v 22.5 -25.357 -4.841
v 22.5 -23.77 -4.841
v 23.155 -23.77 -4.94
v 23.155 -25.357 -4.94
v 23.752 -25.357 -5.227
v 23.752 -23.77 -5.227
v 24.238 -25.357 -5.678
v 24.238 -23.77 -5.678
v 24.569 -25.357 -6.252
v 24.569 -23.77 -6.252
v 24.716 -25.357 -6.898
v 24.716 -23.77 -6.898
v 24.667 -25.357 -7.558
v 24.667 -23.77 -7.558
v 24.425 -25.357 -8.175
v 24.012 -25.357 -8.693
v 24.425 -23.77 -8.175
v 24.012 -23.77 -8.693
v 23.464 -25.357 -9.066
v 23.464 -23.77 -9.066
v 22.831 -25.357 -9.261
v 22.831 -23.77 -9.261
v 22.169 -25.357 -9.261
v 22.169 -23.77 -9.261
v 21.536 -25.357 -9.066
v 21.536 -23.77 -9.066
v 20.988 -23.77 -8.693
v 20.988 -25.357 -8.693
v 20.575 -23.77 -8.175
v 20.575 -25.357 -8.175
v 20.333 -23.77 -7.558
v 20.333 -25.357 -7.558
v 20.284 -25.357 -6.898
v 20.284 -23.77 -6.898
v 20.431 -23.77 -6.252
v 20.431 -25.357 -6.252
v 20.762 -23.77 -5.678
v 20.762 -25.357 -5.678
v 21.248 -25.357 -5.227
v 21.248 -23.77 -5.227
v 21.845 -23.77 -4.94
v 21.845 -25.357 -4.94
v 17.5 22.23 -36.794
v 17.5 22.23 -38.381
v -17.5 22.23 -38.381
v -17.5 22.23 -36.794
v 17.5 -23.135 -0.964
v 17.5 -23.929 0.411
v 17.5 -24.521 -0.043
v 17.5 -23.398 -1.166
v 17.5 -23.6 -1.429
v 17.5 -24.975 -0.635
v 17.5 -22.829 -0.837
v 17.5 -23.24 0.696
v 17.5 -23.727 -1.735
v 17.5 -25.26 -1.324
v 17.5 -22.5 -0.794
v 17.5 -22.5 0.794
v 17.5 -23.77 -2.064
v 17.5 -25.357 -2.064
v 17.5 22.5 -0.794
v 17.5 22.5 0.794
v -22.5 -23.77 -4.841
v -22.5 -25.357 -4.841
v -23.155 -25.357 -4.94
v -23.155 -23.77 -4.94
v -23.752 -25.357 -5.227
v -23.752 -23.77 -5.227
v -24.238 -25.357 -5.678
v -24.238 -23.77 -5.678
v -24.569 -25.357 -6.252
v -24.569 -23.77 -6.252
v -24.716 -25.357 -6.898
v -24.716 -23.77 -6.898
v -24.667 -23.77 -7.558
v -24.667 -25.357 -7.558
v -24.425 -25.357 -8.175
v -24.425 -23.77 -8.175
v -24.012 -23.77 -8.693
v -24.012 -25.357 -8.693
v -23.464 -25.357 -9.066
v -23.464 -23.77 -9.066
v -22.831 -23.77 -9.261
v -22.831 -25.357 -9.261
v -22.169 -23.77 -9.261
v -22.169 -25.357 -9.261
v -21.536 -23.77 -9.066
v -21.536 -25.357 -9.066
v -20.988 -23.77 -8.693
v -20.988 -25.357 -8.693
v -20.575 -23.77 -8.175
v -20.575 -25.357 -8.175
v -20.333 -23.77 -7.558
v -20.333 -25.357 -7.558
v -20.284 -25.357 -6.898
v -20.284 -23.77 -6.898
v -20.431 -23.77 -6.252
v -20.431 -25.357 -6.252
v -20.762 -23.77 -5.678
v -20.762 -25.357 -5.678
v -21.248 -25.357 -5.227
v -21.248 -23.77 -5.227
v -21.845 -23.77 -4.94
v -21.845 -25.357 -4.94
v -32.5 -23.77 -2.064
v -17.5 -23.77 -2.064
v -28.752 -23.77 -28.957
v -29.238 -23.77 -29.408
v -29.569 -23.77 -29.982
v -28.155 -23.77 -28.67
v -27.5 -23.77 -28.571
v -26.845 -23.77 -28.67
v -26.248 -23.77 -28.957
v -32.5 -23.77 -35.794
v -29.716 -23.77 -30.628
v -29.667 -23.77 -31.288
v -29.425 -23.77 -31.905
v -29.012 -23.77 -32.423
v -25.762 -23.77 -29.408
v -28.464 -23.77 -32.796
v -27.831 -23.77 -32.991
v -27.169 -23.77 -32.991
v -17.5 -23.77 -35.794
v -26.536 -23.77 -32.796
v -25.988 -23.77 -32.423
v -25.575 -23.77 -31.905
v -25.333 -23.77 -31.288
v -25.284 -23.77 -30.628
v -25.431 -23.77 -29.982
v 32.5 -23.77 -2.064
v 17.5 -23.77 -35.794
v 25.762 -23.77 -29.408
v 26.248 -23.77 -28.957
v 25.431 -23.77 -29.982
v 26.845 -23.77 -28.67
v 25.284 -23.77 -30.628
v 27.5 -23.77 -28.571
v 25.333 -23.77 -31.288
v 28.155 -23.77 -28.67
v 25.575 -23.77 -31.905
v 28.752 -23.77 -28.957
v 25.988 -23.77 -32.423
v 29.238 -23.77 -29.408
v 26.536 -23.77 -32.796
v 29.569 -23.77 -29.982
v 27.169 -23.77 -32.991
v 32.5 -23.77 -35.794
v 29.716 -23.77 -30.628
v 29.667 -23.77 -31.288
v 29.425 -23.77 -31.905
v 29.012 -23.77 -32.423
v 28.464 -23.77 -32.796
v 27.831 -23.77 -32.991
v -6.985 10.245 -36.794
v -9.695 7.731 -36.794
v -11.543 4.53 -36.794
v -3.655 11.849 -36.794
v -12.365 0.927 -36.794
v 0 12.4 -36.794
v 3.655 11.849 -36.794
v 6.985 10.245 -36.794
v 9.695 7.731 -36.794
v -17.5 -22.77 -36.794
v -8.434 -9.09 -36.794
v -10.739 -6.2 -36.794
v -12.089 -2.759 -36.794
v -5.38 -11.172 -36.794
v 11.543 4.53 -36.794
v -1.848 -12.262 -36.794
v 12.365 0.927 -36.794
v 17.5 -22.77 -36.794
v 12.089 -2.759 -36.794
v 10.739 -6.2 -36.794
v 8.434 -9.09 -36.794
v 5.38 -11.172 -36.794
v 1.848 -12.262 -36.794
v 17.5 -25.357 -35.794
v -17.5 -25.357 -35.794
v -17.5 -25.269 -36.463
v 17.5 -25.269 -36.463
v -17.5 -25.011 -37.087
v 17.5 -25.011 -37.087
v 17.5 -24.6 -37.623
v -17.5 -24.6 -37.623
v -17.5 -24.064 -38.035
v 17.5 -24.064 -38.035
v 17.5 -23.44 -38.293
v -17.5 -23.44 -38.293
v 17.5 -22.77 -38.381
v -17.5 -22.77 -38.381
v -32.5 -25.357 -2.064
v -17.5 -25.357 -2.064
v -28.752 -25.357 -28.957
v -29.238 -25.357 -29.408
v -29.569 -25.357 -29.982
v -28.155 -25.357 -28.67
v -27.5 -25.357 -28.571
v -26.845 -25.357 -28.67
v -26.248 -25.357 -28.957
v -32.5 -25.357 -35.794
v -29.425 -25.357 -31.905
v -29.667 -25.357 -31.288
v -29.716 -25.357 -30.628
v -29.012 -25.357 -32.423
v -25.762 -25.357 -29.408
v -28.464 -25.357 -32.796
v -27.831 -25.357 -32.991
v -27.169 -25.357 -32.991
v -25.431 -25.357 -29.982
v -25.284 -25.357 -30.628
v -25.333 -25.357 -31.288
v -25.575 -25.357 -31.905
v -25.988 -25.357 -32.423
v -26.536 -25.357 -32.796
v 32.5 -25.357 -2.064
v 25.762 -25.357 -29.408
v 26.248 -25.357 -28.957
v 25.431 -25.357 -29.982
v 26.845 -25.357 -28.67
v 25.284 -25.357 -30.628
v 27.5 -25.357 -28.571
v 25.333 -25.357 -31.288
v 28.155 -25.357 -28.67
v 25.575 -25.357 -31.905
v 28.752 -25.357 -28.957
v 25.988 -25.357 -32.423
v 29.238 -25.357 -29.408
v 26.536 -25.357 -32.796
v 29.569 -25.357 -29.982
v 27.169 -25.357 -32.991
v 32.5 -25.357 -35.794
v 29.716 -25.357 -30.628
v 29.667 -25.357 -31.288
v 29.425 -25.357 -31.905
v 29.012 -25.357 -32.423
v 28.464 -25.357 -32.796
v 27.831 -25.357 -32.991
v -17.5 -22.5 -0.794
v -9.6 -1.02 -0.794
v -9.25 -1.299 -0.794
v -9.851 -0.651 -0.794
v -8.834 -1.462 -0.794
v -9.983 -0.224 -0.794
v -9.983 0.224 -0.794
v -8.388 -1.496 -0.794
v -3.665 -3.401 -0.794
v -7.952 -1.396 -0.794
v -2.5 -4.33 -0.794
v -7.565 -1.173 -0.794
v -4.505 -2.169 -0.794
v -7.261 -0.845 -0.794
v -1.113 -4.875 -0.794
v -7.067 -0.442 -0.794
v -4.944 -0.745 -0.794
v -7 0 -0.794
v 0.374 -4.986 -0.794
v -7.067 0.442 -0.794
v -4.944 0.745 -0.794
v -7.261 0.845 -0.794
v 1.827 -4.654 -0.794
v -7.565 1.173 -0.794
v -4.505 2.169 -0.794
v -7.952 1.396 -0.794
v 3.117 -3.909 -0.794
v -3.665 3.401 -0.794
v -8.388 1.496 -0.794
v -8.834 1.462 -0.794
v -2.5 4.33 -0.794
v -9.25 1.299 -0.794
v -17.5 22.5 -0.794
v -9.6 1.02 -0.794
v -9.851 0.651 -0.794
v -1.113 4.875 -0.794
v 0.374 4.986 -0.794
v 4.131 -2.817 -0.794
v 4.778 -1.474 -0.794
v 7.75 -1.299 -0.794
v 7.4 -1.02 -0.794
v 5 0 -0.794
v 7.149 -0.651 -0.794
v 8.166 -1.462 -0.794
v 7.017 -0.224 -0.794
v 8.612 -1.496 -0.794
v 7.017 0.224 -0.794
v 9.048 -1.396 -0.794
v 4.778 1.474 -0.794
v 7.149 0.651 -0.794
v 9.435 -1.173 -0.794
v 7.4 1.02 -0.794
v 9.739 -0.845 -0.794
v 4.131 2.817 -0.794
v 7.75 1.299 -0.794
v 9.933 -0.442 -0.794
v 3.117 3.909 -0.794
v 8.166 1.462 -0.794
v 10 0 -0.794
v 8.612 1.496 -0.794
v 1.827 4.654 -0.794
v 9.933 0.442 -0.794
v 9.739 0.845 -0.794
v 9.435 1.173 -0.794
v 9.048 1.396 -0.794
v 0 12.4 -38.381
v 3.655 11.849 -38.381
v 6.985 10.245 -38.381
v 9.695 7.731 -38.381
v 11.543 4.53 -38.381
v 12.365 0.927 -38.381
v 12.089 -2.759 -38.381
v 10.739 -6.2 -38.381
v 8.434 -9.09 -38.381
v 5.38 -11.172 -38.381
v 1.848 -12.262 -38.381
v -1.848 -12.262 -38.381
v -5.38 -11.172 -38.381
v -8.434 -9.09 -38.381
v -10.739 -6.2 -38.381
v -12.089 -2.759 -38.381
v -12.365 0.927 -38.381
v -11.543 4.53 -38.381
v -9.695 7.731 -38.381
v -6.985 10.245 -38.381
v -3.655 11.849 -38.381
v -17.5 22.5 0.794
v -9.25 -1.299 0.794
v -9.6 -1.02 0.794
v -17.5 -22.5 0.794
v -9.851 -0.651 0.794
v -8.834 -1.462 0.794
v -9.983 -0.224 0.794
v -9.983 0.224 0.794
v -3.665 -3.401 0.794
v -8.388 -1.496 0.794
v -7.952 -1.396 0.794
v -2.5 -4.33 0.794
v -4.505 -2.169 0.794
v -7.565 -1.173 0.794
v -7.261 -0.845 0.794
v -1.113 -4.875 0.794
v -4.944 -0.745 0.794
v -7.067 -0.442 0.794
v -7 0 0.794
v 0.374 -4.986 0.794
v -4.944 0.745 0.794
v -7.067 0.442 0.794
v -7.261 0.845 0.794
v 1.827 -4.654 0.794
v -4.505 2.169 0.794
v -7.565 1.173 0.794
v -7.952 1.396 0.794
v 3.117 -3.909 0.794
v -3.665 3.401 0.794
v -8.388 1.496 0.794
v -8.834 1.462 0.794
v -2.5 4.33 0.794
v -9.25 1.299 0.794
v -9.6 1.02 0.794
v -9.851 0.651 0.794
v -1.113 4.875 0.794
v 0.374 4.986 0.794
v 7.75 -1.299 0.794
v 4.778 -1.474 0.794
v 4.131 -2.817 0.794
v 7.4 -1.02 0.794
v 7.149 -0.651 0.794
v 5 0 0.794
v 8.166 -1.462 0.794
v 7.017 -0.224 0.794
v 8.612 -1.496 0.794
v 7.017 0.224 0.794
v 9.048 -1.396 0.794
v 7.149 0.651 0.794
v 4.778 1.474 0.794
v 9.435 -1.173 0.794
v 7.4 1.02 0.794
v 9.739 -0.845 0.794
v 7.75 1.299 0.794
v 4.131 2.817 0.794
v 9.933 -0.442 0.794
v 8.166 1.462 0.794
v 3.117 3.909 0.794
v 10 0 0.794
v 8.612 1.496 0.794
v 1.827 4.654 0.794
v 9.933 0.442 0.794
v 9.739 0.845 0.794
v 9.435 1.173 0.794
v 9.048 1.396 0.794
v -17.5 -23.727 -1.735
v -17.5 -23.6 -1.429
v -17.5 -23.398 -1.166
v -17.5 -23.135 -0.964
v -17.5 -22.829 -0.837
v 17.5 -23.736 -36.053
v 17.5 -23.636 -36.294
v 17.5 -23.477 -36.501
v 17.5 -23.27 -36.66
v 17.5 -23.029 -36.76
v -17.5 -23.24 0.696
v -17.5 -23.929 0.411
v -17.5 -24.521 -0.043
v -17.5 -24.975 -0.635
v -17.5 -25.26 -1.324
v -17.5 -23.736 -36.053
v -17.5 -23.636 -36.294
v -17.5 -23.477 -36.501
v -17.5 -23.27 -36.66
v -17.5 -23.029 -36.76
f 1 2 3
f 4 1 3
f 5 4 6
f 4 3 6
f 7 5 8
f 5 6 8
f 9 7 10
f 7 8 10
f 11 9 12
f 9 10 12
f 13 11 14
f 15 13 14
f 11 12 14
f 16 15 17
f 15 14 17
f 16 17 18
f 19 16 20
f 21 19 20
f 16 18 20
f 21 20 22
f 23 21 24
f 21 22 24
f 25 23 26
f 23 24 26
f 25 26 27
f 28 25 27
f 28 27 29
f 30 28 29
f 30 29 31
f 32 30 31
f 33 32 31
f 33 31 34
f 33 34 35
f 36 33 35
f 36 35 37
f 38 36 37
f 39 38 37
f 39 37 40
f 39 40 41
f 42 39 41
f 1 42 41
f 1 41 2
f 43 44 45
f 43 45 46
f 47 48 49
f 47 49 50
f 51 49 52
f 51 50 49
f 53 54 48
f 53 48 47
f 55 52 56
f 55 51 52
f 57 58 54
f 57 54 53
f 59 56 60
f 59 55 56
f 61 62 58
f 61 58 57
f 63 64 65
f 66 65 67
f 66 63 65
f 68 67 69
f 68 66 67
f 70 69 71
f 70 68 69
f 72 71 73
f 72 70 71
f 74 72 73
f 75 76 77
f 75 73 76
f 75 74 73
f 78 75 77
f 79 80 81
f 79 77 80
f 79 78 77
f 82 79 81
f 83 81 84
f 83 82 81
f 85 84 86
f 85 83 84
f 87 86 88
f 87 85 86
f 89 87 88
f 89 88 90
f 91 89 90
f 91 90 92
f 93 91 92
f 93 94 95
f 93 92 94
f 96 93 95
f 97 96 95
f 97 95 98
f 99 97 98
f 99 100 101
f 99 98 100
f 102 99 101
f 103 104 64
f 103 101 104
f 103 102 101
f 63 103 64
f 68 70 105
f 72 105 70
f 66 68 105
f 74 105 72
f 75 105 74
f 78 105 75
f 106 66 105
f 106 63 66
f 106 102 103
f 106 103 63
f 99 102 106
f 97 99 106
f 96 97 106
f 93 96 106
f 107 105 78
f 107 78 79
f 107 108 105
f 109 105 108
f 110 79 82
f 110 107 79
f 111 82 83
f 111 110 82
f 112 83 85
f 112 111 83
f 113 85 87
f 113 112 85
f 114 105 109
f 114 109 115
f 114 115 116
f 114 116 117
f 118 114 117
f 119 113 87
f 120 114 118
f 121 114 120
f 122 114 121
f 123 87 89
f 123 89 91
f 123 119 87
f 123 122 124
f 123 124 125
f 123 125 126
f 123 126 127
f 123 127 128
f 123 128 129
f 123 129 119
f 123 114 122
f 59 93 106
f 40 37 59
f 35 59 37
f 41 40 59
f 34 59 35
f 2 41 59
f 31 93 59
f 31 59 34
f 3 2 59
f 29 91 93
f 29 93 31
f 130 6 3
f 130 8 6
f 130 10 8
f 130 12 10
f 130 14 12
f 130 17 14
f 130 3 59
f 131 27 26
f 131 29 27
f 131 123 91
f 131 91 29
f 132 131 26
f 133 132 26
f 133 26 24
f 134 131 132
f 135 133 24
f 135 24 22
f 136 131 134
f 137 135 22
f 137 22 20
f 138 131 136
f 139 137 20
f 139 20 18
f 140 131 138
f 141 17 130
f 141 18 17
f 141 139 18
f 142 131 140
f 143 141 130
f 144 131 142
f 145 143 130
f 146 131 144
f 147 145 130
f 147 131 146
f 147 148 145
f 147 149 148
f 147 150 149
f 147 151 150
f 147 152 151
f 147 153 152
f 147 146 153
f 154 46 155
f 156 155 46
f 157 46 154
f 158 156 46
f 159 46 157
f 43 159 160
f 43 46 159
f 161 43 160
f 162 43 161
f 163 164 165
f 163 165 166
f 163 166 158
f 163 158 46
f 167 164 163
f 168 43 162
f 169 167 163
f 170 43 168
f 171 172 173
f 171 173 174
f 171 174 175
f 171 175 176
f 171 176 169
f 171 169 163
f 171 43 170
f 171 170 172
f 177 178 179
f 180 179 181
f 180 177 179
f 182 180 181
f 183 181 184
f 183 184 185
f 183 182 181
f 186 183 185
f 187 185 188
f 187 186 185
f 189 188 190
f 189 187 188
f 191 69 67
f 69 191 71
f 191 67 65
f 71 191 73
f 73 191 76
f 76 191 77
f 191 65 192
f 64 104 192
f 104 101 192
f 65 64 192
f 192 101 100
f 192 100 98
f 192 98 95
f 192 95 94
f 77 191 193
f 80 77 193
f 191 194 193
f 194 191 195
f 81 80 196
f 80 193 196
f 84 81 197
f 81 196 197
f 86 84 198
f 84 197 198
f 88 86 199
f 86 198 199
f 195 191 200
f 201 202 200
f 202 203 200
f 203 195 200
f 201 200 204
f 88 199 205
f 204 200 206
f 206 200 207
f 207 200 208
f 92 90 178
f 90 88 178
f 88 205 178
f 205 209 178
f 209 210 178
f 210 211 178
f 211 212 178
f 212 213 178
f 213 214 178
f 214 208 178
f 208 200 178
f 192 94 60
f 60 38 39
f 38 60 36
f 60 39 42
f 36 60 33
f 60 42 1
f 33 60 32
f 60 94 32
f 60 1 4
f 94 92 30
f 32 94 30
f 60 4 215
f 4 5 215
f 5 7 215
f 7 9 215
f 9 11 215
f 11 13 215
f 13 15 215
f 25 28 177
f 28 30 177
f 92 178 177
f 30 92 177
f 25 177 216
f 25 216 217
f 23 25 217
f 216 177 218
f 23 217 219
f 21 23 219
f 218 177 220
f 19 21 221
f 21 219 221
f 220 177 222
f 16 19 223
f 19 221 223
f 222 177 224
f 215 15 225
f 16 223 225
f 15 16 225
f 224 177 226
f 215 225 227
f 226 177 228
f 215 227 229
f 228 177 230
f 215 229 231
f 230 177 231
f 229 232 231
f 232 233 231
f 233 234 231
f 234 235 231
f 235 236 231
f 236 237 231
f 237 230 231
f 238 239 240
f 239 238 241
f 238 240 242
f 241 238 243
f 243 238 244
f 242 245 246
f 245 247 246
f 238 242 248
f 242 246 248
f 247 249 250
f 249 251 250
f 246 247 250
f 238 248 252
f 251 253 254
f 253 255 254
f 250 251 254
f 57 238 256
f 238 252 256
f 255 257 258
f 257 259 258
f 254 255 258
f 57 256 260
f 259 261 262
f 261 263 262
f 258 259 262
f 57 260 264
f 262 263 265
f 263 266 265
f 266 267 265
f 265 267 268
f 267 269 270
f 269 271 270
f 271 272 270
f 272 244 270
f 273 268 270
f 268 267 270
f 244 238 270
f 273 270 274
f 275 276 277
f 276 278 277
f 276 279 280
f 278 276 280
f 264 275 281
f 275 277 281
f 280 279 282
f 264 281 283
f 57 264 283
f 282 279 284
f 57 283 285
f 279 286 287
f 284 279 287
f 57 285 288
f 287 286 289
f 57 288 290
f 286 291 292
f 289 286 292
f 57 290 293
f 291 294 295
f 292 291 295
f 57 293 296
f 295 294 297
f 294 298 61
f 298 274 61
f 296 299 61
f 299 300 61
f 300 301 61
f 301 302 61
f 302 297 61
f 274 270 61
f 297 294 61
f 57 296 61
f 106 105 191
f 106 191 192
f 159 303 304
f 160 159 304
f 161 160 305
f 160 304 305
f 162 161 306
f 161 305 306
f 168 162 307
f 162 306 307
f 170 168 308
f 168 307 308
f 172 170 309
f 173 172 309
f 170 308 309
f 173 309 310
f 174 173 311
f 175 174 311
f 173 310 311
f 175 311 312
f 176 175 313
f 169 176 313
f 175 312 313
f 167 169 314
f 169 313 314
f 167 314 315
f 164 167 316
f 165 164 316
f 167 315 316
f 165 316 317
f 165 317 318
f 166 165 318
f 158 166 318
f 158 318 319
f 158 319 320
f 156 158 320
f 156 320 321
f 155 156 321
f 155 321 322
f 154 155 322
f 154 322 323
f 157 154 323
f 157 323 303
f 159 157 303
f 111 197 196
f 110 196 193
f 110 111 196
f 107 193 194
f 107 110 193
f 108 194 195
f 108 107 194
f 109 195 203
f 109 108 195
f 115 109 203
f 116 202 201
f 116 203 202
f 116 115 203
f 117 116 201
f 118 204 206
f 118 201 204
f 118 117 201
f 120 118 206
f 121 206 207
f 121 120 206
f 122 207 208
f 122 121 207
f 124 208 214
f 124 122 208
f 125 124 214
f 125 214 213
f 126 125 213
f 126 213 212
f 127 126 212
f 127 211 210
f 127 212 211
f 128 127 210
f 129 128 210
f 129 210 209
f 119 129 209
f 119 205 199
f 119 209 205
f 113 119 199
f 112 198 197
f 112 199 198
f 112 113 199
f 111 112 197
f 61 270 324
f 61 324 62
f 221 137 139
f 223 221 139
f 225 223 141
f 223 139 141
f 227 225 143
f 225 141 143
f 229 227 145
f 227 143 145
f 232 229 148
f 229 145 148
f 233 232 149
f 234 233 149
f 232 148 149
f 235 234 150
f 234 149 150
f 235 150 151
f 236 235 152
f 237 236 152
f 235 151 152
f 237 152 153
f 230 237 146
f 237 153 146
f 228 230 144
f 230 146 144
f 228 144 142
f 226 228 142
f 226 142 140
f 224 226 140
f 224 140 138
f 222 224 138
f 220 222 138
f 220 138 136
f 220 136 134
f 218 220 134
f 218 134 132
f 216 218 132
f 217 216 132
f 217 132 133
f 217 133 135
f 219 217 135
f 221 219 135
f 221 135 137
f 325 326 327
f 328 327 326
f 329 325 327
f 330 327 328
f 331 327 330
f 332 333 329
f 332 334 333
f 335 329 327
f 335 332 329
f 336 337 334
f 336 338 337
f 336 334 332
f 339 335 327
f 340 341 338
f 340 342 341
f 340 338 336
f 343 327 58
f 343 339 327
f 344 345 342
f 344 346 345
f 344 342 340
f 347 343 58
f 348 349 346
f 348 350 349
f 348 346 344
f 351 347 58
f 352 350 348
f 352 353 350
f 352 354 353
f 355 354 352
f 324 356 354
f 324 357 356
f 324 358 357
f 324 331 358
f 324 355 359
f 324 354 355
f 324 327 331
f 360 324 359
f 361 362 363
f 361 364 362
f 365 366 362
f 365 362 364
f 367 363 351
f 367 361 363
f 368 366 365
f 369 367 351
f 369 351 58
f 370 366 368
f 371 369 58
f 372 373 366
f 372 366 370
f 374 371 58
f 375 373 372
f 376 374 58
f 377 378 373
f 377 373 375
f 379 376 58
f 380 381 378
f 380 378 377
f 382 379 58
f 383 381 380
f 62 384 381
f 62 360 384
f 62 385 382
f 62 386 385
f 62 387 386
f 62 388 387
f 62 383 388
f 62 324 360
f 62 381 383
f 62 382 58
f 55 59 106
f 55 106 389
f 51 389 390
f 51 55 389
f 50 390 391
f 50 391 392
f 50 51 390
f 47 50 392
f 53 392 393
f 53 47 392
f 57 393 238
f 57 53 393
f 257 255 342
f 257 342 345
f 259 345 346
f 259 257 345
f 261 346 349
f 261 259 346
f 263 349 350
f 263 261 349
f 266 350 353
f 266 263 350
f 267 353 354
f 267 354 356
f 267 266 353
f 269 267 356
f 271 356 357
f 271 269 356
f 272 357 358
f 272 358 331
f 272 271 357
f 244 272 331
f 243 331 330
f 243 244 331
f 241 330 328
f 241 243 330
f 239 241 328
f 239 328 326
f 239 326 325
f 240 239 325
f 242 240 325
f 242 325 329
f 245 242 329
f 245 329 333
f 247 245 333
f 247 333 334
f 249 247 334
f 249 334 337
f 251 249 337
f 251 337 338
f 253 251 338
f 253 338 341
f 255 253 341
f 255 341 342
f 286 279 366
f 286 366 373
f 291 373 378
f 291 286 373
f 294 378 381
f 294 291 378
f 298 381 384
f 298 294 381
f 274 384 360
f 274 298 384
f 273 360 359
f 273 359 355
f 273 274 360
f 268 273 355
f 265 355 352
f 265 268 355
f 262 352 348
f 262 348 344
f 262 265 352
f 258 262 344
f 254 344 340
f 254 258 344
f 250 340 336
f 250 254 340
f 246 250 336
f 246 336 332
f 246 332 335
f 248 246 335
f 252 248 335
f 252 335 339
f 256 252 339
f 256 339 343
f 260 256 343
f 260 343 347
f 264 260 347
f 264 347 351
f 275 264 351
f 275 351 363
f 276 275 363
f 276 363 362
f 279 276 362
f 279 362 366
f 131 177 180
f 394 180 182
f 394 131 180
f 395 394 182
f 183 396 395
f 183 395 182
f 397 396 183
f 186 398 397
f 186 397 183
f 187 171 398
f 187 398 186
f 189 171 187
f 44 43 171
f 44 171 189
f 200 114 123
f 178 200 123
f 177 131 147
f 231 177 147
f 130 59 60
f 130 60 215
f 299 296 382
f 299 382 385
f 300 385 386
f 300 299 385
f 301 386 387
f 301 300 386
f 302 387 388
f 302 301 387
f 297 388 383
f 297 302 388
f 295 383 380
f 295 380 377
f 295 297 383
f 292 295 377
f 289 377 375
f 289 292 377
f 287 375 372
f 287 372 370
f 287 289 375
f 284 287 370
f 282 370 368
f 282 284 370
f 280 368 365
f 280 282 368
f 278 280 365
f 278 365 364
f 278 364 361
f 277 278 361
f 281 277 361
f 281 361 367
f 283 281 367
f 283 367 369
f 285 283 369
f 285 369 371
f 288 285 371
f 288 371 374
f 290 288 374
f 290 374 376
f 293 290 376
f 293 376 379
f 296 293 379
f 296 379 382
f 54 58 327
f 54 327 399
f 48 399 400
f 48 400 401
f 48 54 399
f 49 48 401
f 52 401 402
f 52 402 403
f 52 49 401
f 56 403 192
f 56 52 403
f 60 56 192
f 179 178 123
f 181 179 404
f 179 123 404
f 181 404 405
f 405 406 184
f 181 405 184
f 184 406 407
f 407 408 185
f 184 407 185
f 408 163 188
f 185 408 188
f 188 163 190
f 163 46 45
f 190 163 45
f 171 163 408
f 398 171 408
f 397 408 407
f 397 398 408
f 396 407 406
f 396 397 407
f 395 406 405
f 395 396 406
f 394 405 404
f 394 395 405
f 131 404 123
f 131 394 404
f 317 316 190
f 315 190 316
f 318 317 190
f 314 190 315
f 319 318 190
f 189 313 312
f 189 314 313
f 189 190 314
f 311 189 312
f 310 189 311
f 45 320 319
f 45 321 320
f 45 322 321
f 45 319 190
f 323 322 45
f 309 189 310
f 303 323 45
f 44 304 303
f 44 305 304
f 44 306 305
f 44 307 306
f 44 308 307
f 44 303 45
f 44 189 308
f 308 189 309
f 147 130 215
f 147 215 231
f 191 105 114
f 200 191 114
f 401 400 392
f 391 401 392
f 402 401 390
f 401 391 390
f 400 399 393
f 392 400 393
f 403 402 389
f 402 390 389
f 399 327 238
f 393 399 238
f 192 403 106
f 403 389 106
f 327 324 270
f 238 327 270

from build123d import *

# Parameters (mm, degrees)
SKETCH1_W                  = 35
SKETCH1_H                  = 45
SKETCH1_R                  = 1.5
SKETCH1_R_2                = 5
BOSS_EXTRUDE1_DEPTH        = 0.79375
CONVERT_SOLID2_START       = -0.79375
CONVERT_SOLID2_OUTLINE_W   = 35
CONVERT_SOLID2_OUTLINE_H   = 45
CONVERT_SOLID2_OUTLINE_R   = 1.5
CONVERT_SOLID2_OUTLINE_R_2 = 5
CONVERT_SOLID2_DEPTH       = 0.79375
EDGE_FLANGE1_DEPTH         = 35
EDGE_FLANGE2_DEPTH         = 35
SKETCH24_R                 = 12.4
CUT_EXTRUDE1_DEPTH         = 10
SKETCH29_W                 = 15
SKETCH29_H                 = 33.73
TAB1_DEPTH                 = 1.5875
SKETCH32_W                 = 15
SKETCH32_H                 = 33.73
TAB2_DEPTH                 = 1.5875
SKETCH35_R                 = 2.2225
CUT_EXTRUDE2_DEPTH         = 10


# Read off the part's stored shape, not the designer's step: Convert-Solid2
# Sheet-metal steps are written as plain solids
with BuildPart() as part:
    # Sketch1 → Boss-Extrude1 (new body)
    with BuildSketch(Plane.XY):
        Rectangle(SKETCH1_W, SKETCH1_H)
        with Locations((-8.5, 0)):
            Circle(SKETCH1_R, mode=Mode.SUBTRACT)
        with Locations((8.5, 0)):
            Circle(SKETCH1_R, mode=Mode.SUBTRACT)
        Circle(SKETCH1_R_2, mode=Mode.SUBTRACT)
    extrude(amount=BOSS_EXTRUDE1_DEPTH)

    # Convert-Solid2 outline → Convert-Solid2 (add)
    with BuildSketch(Plane.XY.offset(CONVERT_SOLID2_START)):
        Rectangle(CONVERT_SOLID2_OUTLINE_W, CONVERT_SOLID2_OUTLINE_H)
        with Locations((-8.5, 0)):
            Circle(CONVERT_SOLID2_OUTLINE_R, mode=Mode.SUBTRACT)
        Circle(CONVERT_SOLID2_OUTLINE_R_2, mode=Mode.SUBTRACT)
        with Locations((8.5, 0)):
            Circle(CONVERT_SOLID2_OUTLINE_R, mode=Mode.SUBTRACT)
    extrude(amount=CONVERT_SOLID2_DEPTH)

    # Edge-Flange1 section (across the edge) → Edge-Flange1 (add)
    with BuildSketch(Plane(origin=(17.5, -23.77, -0.79375), x_dir=(0, 1, 0), z_dir=(-1, 0, 0))):
        with BuildLine():
            Line((-1.5875, 1.27), (-1.5875, 35))
            Line((-1.5875, 35), (0, 35))
            Line((0, 35), (0, 1.27))
            ThreePointArc((0, 1.27), (0.371974388, 0.371974388), (1.27, 0))
            Line((1.27, 0), (1.27, -1.5875))
            ThreePointArc((1.27, -1.5875), (-0.750557627, -0.750557627), (-1.5875, 1.27))
        make_face()
    extrude(amount=EDGE_FLANGE1_DEPTH)

    # Edge-Flange2 section (across the edge) → Edge-Flange2 (add)
    with BuildSketch(Plane(origin=(17.5, -23.77, -36.79375), x_dir=(0, 0, 1), z_dir=(-1, 0, 0))):
        with BuildLine():
            Line((-1.5875, 1), (-1.5875, 46))
            Line((-1.5875, 46), (0, 46))
            Line((0, 46), (0, 1))
            ThreePointArc((0, 1), (0.292893219, 0.292893219), (1, 0))
            Line((1, 0), (1, -1.5875))
            ThreePointArc((1, -1.5875), (-0.829638796, -0.829638796), (-1.5875, 1))
        make_face()
    extrude(amount=EDGE_FLANGE2_DEPTH)

    # Sketch24 → Cut-Extrude1 (cut)
    with BuildSketch(Plane(origin=(0, 0, -38.38125), x_dir=(-1, 0, 0), z_dir=(0, 0, -1))):
        with Locations(Location((0, 0, 0), (0, 0, 90))):
            Circle(SKETCH24_R)
    extrude(amount=-CUT_EXTRUDE1_DEPTH, mode=Mode.SUBTRACT)

    # Sketch29 → Tab1 (add)
    with BuildSketch(Plane(origin=(0, -23.77, 0), x_dir=(1, 0, 0), z_dir=(0, 1, 0))):
        with Locations((25, 18.92875)):
            Rectangle(SKETCH29_W, SKETCH29_H)
    extrude(amount=-TAB1_DEPTH)

    # Sketch32 → Tab2 (add)
    with BuildSketch(Plane(origin=(0, -23.77, 0), x_dir=(1, 0, 0), z_dir=(0, 1, 0))):
        with Locations((-25, 18.92875)):
            Rectangle(SKETCH32_W, SKETCH32_H)
    extrude(amount=-TAB2_DEPTH)

    # Sketch35 → Cut-Extrude2 (cut)
    with BuildSketch(Plane(origin=(0, -23.77, 0), x_dir=(1, 0, 0), z_dir=(0, 1, 0))):
        with Locations(Location((22.5, 7.06375, 0), (0, 0, 270))):
            Circle(SKETCH35_R)
        with Locations(Location((27.5, 30.79375, 0), (0, 0, 270))):
            Circle(SKETCH35_R)
    cut_extrude2 = extrude(amount=-CUT_EXTRUDE2_DEPTH, mode=Mode.SUBTRACT)

    # Mirror1: Cut-Extrude2 across plane
    add(cut_extrude2.mirror(Plane(origin=(0, 0, 0), x_dir=(0, 0, 1), z_dir=(1, 0, 0))), mode=Mode.SUBTRACT)


solid = part.part
